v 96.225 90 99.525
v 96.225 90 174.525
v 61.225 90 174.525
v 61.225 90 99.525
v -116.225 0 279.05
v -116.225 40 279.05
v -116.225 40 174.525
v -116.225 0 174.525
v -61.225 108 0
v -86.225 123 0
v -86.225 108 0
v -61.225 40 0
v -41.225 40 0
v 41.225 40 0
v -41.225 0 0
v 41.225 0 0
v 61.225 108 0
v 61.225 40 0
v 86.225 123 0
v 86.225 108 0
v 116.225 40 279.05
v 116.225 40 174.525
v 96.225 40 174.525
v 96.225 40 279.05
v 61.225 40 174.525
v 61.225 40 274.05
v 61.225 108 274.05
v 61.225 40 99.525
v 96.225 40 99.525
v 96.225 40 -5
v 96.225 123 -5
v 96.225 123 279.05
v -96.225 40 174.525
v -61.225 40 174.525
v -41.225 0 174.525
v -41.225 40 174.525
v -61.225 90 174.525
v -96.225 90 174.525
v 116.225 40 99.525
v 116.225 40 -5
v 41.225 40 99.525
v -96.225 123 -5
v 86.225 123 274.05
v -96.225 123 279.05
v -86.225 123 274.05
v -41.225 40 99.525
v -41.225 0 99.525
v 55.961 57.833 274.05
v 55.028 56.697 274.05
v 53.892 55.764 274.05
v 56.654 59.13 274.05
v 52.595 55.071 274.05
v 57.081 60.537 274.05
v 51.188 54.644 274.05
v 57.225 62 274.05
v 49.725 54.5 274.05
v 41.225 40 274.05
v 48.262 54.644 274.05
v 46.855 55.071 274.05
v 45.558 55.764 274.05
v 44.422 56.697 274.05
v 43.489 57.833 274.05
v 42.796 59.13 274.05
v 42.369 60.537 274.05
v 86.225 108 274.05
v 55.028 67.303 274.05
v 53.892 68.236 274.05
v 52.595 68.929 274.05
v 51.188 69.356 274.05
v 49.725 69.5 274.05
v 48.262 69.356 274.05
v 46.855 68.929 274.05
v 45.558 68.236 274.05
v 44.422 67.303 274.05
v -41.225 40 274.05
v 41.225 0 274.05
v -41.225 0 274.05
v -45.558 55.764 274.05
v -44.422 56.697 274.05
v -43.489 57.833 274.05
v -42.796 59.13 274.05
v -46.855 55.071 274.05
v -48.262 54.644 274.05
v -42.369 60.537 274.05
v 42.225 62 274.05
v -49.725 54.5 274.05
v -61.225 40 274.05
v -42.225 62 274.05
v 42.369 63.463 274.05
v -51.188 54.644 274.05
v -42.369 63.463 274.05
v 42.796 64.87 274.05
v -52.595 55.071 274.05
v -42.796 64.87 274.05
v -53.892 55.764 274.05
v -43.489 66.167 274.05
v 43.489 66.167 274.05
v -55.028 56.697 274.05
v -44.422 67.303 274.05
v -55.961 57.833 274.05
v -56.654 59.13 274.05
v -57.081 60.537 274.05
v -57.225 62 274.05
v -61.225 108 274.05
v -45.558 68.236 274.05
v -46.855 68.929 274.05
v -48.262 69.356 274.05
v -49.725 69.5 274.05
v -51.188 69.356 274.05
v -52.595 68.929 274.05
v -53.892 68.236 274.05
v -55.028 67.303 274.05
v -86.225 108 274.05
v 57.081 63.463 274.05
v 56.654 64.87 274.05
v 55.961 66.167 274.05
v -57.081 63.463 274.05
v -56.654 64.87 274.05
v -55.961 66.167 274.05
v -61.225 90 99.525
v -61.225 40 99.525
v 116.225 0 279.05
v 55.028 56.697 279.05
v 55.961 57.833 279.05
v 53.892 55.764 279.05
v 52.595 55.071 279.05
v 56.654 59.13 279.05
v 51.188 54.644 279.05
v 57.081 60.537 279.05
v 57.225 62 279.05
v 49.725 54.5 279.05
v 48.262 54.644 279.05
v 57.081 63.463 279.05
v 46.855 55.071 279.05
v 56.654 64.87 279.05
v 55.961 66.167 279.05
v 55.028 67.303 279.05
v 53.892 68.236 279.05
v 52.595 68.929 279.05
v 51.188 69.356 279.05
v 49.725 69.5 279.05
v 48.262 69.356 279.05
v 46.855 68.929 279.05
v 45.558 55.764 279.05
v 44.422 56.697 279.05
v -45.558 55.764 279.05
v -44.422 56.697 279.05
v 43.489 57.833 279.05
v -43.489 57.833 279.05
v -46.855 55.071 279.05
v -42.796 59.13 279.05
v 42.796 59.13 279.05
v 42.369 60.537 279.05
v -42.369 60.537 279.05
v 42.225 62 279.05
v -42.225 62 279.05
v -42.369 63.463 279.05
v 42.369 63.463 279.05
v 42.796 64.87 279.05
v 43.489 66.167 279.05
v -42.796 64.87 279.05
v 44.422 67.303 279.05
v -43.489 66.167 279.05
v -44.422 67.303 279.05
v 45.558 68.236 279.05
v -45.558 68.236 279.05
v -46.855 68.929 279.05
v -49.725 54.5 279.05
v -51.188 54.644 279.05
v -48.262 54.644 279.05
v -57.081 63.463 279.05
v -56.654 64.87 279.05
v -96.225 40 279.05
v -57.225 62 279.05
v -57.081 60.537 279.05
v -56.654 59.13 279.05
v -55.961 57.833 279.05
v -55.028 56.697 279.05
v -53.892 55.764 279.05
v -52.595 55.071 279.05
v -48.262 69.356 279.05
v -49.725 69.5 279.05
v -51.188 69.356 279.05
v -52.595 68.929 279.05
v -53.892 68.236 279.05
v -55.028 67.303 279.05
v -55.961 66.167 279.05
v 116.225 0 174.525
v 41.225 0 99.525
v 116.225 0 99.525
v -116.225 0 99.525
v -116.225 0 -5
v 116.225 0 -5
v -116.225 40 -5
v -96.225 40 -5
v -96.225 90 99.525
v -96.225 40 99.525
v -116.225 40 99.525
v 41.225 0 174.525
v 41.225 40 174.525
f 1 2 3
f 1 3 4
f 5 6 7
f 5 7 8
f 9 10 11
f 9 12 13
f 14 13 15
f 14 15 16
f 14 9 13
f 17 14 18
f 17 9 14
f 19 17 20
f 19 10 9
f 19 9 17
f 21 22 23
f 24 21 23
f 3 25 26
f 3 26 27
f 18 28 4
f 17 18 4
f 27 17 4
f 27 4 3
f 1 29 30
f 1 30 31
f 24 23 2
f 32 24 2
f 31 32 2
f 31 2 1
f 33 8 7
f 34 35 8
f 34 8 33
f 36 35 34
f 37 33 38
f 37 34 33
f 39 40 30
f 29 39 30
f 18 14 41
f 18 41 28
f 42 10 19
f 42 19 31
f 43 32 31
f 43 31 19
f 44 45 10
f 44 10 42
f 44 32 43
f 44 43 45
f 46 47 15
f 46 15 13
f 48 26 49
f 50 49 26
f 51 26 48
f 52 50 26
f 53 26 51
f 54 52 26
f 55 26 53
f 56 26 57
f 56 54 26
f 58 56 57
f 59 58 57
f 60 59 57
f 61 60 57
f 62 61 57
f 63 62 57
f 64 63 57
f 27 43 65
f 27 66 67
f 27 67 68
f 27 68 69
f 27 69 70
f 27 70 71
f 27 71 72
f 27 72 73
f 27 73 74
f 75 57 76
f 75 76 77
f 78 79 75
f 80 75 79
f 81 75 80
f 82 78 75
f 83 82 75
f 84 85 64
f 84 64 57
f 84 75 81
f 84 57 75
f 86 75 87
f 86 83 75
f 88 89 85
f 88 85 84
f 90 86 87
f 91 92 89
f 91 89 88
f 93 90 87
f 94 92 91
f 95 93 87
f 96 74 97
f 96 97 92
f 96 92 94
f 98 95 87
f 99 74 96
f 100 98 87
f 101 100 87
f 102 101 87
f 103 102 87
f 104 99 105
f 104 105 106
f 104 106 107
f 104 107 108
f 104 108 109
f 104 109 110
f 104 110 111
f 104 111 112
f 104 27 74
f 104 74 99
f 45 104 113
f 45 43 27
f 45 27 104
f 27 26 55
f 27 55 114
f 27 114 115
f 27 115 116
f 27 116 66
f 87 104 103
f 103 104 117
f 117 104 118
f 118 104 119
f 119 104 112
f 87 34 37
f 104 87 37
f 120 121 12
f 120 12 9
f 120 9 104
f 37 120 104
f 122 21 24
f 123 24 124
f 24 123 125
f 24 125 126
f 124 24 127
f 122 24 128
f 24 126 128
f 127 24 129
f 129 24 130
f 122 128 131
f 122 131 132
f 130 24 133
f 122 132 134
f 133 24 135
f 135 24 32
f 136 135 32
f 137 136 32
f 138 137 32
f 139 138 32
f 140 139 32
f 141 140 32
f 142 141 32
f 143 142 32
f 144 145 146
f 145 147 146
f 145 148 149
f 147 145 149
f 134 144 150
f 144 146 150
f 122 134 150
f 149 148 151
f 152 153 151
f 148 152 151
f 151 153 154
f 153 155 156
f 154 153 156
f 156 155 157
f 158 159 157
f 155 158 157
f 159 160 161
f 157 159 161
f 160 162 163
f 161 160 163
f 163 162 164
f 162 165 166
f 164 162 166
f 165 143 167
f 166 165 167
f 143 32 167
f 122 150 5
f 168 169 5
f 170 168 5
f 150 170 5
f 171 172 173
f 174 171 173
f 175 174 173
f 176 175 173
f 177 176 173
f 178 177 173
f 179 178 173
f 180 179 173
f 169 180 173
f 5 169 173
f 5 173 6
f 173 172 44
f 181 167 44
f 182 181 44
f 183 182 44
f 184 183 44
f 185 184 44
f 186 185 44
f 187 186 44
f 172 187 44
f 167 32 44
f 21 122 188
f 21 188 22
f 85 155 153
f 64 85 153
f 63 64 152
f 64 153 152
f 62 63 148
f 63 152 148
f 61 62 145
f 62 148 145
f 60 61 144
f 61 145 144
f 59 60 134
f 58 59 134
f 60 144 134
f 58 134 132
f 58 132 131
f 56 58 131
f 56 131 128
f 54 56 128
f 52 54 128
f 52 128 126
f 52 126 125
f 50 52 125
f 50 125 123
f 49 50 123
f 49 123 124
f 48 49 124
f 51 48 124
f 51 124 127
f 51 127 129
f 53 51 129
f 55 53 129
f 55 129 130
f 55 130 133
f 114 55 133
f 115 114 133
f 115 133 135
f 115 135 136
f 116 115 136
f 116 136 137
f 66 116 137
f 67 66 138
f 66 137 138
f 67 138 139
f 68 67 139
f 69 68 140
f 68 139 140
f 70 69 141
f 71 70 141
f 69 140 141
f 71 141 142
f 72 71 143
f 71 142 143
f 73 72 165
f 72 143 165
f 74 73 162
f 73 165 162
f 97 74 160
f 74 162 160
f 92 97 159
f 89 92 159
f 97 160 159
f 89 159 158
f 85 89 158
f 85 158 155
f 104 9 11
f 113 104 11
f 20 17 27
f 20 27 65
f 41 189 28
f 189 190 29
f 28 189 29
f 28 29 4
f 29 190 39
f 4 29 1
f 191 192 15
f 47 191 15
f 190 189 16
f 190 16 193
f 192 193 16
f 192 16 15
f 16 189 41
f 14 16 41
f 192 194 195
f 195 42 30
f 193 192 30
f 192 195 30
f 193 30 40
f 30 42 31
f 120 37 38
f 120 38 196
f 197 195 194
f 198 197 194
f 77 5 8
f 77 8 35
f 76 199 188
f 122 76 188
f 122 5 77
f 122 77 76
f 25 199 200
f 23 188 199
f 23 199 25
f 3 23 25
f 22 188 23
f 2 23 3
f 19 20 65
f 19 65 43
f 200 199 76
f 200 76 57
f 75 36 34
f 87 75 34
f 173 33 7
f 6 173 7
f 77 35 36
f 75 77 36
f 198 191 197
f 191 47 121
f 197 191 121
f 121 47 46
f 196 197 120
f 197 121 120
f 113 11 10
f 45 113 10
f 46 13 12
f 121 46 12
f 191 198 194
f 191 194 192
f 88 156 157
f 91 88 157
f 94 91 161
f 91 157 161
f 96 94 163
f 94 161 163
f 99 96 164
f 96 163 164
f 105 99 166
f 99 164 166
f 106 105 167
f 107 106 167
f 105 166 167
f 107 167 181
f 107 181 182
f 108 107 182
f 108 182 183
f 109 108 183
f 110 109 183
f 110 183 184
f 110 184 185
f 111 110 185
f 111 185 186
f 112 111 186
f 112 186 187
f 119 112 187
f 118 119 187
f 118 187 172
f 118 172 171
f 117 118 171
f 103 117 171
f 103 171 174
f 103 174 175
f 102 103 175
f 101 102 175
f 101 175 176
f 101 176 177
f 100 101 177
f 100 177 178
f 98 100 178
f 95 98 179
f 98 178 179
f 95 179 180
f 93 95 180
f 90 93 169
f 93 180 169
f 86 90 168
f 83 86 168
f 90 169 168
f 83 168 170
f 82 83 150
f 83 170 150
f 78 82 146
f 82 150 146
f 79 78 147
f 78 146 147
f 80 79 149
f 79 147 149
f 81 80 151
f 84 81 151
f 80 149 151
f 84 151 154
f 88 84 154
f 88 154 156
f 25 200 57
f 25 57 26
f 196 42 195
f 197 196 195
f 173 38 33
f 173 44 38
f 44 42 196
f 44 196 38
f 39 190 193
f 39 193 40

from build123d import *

# Parameters (mm, degrees)
BOSS_EXTRUDE1_DEPTH   = 274.05
BOSS_EXTRUDE1_2_DEPTH = 274.05
BOSS_EXTRUDE2_DEPTH   = 5
BOSS_EXTRUDE3_DEPTH   = 5
SKETCH4_W             = 75
SKETCH4_H             = 90
CUT_EXTRUDE4_DEPTH    = 300
SKETCH5_R             = 7.5
CUT_EXTRUDE5_DEPTH    = 10


with BuildPart() as part:
    # Sketch1 → Boss-Extrude1 (new body)
    with BuildSketch(Plane.XY):
        Polygon((-41.225, 0), (-41.225, 40), (-61.225, 40), (-61.225, 108), (-86.225, 108), (-86.225, 123), (-96.225, 123), (-96.225, 40), (-116.225, 40), (-116.225, 0), align=None)
    extrude(amount=BOSS_EXTRUDE1_DEPTH)



with BuildPart() as body_2:
    # Sketch1 → Boss-Extrude1 2 (new body)
    with BuildSketch(Plane.XY):
        Polygon((116.225, 0), (41.225, 0), (41.225, 40), (61.225, 40), (61.225, 108), (86.225, 108), (86.225, 123), (96.225, 123), (96.225, 40), (116.225, 40), align=None)
    extrude(amount=BOSS_EXTRUDE1_2_DEPTH)


with BuildPart() as part_1:
    add(part.part)

    add(body_2.part)  # Boss-Extrude2 merges body 2
    # Sketch2 → Boss-Extrude2 (add)
    with BuildSketch(Plane.XY.offset(274.05)):
        Polygon((-96.225, 123), (96.225, 123), (96.225, 40), (116.225, 40), (116.225, 0), (-116.225, 0), (-116.225, 40), (-96.225, 40), align=None)
    extrude(amount=BOSS_EXTRUDE2_DEPTH)

    # Sketch3 → Boss-Extrude3 (add)
    with BuildSketch(Plane(origin=(0, 0, 0), x_dir=(-1, 0, 0), z_dir=(0, 0, -1))):
        Polygon((-96.225, 123), (96.225, 123), (96.225, 40), (116.225, 40), (116.225, 0), (-116.225, 0), (-116.225, 40), (-96.225, 40), align=None)
    extrude(amount=BOSS_EXTRUDE3_DEPTH)

    # Sketch4 → Cut-Extrude4 (cut)
    with BuildSketch(Plane(origin=(116.225, 0, 0), x_dir=(0, 0, -1), z_dir=(1, 0, 0))):
        with Locations((-137.025, 45)):
            Rectangle(SKETCH4_W, SKETCH4_H)
    extrude(amount=-CUT_EXTRUDE4_DEPTH, mode=Mode.SUBTRACT)

    # Sketch5 → Cut-Extrude5 (cut)
    with BuildSketch(Plane.XY.offset(279.05)):
        with Locations((-49.725, 62)):
            Circle(SKETCH5_R)
        with Locations(Location((49.725, 62, 0), (0, 0, 180))):
            Circle(SKETCH5_R)
    extrude(amount=-CUT_EXTRUDE5_DEPTH, mode=Mode.SUBTRACT)


solid = part_1.part
